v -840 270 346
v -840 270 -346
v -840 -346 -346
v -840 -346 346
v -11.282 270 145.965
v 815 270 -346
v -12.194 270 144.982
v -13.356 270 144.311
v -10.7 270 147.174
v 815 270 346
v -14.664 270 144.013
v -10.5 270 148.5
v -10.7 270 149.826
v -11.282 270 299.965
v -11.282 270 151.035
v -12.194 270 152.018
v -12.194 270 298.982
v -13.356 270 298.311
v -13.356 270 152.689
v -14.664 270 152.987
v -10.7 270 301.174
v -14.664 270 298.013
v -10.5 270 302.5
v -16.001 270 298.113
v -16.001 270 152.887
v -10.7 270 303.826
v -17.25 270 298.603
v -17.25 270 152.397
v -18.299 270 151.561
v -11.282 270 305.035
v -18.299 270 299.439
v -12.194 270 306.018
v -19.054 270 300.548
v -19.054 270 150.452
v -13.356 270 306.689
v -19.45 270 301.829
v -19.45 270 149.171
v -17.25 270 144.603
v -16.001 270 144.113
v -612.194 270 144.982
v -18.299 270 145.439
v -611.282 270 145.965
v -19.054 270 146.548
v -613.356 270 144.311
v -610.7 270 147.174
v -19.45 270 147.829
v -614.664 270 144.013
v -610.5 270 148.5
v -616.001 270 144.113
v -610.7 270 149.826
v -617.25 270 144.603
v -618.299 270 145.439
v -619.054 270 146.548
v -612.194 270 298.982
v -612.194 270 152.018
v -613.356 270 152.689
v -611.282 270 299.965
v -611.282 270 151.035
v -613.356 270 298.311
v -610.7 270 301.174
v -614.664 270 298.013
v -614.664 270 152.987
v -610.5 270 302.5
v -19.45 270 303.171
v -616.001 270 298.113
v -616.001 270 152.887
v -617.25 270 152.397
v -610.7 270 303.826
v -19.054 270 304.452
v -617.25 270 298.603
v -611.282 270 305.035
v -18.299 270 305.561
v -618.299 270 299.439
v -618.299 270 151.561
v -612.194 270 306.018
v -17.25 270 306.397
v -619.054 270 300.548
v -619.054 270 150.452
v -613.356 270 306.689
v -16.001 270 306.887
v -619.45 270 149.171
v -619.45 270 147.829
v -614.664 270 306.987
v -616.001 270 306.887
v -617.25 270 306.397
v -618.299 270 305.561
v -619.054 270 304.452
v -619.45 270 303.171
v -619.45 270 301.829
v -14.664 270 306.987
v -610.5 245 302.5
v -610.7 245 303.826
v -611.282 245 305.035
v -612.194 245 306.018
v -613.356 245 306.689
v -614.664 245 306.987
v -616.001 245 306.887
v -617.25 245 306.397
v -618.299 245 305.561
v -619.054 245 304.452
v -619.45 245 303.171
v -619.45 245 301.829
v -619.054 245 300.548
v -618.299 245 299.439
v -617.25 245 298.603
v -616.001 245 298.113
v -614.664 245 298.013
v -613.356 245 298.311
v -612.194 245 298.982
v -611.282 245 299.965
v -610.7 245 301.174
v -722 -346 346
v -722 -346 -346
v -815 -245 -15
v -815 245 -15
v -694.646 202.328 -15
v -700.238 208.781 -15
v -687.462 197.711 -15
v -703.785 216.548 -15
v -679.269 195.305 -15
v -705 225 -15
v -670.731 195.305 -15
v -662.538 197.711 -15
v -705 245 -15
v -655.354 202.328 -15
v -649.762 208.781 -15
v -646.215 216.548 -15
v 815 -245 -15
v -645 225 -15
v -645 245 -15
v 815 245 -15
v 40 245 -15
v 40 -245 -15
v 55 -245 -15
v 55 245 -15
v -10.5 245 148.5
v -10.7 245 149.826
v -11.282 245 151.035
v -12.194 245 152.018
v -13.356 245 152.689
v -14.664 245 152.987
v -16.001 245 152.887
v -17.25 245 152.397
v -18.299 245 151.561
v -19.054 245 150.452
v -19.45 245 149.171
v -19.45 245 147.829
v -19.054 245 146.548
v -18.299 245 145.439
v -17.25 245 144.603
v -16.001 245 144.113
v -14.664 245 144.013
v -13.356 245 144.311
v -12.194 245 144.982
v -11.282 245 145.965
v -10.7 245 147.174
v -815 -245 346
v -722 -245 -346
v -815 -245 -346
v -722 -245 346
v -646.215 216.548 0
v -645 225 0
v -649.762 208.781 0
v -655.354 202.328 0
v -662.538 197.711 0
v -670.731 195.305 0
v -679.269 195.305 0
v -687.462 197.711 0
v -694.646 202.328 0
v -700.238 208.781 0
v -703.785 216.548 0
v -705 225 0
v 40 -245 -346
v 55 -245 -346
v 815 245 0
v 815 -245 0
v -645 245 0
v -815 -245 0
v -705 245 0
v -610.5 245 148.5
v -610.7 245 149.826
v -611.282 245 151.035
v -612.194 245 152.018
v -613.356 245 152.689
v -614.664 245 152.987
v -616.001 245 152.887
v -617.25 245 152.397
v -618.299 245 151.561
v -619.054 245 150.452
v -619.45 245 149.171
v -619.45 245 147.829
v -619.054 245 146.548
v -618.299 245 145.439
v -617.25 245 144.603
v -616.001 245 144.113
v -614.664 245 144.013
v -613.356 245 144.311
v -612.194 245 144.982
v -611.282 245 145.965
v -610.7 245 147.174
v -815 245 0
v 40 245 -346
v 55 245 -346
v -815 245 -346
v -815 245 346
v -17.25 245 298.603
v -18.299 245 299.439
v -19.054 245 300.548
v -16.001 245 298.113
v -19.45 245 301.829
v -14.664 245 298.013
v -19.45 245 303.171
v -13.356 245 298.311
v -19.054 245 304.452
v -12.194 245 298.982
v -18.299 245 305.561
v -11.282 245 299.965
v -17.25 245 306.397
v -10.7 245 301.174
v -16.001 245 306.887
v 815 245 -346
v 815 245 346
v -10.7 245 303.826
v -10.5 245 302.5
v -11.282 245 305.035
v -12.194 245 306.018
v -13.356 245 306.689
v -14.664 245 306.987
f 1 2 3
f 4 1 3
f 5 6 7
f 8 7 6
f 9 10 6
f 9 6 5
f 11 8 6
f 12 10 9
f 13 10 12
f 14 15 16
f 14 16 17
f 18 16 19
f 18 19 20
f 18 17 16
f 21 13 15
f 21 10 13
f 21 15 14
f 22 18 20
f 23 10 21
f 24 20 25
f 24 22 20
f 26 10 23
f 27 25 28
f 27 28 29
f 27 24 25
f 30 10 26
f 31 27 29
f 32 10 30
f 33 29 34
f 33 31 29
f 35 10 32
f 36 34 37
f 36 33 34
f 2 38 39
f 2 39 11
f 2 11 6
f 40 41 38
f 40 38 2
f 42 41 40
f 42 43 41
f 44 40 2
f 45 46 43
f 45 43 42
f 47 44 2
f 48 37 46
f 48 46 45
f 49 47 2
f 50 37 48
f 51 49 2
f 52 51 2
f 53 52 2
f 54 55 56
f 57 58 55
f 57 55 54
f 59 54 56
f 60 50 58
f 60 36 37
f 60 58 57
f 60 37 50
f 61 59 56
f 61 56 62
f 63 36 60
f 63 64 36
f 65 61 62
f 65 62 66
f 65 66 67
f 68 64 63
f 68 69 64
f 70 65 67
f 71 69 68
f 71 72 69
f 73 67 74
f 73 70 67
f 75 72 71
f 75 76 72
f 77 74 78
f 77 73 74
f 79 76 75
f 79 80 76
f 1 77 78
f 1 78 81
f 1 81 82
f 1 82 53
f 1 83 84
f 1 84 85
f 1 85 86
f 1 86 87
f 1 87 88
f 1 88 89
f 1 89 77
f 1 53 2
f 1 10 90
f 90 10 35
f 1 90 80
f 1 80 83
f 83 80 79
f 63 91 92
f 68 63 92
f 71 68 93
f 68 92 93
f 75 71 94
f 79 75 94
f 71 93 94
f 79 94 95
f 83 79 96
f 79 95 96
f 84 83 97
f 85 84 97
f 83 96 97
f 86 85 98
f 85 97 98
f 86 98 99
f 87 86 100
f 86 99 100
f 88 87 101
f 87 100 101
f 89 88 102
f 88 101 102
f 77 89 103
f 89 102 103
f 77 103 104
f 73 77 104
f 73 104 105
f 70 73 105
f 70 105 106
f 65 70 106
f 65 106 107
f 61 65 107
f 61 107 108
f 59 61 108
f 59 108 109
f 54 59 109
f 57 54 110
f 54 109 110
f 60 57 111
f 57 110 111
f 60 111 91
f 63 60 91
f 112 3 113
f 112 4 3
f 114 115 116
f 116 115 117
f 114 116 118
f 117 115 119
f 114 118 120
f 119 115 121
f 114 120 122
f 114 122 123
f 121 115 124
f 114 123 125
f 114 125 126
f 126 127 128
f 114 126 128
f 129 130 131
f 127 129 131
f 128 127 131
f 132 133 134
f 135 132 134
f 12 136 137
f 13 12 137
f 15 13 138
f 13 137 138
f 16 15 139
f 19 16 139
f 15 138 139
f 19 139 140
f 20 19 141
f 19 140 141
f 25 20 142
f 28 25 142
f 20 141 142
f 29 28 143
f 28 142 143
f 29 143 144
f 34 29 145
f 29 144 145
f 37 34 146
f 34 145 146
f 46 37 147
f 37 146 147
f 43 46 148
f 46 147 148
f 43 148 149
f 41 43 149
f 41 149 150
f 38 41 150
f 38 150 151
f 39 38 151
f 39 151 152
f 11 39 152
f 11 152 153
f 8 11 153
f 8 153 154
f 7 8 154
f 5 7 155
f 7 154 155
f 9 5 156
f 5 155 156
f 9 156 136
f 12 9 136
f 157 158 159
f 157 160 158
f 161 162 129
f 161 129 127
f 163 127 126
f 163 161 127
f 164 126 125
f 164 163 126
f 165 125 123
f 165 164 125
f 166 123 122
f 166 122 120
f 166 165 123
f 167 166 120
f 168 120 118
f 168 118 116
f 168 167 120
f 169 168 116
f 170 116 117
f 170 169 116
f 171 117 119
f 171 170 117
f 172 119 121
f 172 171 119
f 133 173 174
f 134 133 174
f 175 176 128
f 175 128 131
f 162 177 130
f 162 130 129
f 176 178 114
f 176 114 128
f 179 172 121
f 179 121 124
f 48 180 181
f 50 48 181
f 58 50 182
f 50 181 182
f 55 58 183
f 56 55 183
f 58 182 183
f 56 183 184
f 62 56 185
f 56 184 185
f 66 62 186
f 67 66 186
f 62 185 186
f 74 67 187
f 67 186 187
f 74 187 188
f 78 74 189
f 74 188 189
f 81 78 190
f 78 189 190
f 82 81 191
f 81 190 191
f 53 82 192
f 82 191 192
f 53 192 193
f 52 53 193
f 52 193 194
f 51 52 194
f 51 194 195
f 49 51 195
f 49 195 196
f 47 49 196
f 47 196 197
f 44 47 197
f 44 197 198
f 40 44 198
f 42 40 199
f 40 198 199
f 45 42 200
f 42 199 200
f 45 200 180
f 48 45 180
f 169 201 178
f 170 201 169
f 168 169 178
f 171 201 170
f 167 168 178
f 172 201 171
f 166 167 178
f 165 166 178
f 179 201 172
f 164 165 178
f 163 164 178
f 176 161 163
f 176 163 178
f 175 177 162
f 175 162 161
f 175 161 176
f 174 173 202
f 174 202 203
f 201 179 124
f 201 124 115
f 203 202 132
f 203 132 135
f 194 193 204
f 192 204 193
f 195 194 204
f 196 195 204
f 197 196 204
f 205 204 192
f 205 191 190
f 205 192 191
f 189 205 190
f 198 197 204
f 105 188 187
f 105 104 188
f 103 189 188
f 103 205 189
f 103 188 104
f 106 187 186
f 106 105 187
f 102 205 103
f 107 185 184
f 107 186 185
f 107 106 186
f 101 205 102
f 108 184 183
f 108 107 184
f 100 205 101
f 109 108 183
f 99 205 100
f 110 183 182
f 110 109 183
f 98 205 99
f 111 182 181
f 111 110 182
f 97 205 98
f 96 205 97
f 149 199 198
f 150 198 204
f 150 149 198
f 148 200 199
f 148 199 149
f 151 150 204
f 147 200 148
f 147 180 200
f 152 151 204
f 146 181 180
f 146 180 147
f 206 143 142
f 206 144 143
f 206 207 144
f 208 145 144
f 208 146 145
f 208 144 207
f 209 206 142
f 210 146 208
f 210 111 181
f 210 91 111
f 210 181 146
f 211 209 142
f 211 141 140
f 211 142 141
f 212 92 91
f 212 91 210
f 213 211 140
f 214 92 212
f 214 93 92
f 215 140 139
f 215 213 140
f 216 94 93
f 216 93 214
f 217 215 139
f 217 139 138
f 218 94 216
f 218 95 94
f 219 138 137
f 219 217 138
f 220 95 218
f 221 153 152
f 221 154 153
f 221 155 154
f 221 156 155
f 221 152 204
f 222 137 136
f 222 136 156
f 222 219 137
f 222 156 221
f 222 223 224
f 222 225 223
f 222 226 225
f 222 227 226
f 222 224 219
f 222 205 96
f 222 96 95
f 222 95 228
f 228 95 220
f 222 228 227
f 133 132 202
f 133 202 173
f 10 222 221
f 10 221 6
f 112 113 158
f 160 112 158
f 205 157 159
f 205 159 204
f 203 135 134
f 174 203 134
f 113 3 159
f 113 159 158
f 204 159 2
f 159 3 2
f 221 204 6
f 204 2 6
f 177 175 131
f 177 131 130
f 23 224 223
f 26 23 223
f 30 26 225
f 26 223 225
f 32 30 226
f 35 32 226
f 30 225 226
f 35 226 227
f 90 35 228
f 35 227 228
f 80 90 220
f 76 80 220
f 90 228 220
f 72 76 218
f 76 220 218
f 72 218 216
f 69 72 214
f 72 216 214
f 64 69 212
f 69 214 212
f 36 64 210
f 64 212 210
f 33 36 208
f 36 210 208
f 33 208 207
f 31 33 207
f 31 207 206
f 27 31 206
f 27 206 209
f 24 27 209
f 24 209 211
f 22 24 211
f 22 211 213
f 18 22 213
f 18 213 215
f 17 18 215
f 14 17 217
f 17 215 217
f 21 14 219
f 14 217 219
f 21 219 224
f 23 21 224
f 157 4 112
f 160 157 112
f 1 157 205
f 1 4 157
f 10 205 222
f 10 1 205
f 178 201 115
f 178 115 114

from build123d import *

# Parameters (mm, degrees)
F1_DEPTH = 15
F3_DEPTH = 346
F4_W     = 15
F4_H     = 490
F5_DEPTH = 331
F6_R     = 4.5
F7_DEPTH = 25


with BuildPart() as f1:
    # F0 (on Top) → F1 (new body)
    with BuildSketch(Plane.XY):
        with BuildLine():
            Line((-705, 245), (-815, 245))
            Line((-815, 245), (-815, -245))
            Line((-815, -245), (815, -245))
            Line((815, -245), (815, 245))
            Line((815, 245), (-645, 245))
            Line((-645, 245), (-645, 225))
            ThreePointArc((-645, 225), (-675, 195), (-705, 225))
            Line((-705, 225), (-705, 245))
        make_face()
    extrude(amount=-F1_DEPTH)


with BuildPart() as f3:
    # F2 (on face) → F3 (new body, symmetric)
    with BuildSketch(Plane.XY):
        Polygon((-722, -245), (-815, -245), (-815, 245), (-705, 245), (-645, 245), (815, 245), (815, 270), (-840, 270), (-840, -346), (-722, -346), align=None)
    extrude(amount=F3_DEPTH, both=True)

    # F6 (on face) → F7 (cut)
    with BuildSketch(Plane.XZ.offset(-245)):
        with Locations((-615, 302.5)):
            Circle(F6_R)
        with Locations((-615, 148.5)):
            Circle(F6_R)
        with Locations((-15, 302.5)):
            Circle(F6_R)
        with Locations((-15, 148.5)):
            Circle(F6_R)
    extrude(amount=-F7_DEPTH, mode=Mode.SUBTRACT)


with BuildPart() as f5:
    # F4 (on face) → F5 (new body)
    with BuildSketch(Plane(origin=(0, 0, -15), x_dir=(1, 0, 0), z_dir=(0, 0, -1))):
        with Locations((47.5, 0)):
            Rectangle(F4_W, F4_H)
    extrude(amount=F5_DEPTH)


solid = Compound([f1.part, f3.part, f5.part])
